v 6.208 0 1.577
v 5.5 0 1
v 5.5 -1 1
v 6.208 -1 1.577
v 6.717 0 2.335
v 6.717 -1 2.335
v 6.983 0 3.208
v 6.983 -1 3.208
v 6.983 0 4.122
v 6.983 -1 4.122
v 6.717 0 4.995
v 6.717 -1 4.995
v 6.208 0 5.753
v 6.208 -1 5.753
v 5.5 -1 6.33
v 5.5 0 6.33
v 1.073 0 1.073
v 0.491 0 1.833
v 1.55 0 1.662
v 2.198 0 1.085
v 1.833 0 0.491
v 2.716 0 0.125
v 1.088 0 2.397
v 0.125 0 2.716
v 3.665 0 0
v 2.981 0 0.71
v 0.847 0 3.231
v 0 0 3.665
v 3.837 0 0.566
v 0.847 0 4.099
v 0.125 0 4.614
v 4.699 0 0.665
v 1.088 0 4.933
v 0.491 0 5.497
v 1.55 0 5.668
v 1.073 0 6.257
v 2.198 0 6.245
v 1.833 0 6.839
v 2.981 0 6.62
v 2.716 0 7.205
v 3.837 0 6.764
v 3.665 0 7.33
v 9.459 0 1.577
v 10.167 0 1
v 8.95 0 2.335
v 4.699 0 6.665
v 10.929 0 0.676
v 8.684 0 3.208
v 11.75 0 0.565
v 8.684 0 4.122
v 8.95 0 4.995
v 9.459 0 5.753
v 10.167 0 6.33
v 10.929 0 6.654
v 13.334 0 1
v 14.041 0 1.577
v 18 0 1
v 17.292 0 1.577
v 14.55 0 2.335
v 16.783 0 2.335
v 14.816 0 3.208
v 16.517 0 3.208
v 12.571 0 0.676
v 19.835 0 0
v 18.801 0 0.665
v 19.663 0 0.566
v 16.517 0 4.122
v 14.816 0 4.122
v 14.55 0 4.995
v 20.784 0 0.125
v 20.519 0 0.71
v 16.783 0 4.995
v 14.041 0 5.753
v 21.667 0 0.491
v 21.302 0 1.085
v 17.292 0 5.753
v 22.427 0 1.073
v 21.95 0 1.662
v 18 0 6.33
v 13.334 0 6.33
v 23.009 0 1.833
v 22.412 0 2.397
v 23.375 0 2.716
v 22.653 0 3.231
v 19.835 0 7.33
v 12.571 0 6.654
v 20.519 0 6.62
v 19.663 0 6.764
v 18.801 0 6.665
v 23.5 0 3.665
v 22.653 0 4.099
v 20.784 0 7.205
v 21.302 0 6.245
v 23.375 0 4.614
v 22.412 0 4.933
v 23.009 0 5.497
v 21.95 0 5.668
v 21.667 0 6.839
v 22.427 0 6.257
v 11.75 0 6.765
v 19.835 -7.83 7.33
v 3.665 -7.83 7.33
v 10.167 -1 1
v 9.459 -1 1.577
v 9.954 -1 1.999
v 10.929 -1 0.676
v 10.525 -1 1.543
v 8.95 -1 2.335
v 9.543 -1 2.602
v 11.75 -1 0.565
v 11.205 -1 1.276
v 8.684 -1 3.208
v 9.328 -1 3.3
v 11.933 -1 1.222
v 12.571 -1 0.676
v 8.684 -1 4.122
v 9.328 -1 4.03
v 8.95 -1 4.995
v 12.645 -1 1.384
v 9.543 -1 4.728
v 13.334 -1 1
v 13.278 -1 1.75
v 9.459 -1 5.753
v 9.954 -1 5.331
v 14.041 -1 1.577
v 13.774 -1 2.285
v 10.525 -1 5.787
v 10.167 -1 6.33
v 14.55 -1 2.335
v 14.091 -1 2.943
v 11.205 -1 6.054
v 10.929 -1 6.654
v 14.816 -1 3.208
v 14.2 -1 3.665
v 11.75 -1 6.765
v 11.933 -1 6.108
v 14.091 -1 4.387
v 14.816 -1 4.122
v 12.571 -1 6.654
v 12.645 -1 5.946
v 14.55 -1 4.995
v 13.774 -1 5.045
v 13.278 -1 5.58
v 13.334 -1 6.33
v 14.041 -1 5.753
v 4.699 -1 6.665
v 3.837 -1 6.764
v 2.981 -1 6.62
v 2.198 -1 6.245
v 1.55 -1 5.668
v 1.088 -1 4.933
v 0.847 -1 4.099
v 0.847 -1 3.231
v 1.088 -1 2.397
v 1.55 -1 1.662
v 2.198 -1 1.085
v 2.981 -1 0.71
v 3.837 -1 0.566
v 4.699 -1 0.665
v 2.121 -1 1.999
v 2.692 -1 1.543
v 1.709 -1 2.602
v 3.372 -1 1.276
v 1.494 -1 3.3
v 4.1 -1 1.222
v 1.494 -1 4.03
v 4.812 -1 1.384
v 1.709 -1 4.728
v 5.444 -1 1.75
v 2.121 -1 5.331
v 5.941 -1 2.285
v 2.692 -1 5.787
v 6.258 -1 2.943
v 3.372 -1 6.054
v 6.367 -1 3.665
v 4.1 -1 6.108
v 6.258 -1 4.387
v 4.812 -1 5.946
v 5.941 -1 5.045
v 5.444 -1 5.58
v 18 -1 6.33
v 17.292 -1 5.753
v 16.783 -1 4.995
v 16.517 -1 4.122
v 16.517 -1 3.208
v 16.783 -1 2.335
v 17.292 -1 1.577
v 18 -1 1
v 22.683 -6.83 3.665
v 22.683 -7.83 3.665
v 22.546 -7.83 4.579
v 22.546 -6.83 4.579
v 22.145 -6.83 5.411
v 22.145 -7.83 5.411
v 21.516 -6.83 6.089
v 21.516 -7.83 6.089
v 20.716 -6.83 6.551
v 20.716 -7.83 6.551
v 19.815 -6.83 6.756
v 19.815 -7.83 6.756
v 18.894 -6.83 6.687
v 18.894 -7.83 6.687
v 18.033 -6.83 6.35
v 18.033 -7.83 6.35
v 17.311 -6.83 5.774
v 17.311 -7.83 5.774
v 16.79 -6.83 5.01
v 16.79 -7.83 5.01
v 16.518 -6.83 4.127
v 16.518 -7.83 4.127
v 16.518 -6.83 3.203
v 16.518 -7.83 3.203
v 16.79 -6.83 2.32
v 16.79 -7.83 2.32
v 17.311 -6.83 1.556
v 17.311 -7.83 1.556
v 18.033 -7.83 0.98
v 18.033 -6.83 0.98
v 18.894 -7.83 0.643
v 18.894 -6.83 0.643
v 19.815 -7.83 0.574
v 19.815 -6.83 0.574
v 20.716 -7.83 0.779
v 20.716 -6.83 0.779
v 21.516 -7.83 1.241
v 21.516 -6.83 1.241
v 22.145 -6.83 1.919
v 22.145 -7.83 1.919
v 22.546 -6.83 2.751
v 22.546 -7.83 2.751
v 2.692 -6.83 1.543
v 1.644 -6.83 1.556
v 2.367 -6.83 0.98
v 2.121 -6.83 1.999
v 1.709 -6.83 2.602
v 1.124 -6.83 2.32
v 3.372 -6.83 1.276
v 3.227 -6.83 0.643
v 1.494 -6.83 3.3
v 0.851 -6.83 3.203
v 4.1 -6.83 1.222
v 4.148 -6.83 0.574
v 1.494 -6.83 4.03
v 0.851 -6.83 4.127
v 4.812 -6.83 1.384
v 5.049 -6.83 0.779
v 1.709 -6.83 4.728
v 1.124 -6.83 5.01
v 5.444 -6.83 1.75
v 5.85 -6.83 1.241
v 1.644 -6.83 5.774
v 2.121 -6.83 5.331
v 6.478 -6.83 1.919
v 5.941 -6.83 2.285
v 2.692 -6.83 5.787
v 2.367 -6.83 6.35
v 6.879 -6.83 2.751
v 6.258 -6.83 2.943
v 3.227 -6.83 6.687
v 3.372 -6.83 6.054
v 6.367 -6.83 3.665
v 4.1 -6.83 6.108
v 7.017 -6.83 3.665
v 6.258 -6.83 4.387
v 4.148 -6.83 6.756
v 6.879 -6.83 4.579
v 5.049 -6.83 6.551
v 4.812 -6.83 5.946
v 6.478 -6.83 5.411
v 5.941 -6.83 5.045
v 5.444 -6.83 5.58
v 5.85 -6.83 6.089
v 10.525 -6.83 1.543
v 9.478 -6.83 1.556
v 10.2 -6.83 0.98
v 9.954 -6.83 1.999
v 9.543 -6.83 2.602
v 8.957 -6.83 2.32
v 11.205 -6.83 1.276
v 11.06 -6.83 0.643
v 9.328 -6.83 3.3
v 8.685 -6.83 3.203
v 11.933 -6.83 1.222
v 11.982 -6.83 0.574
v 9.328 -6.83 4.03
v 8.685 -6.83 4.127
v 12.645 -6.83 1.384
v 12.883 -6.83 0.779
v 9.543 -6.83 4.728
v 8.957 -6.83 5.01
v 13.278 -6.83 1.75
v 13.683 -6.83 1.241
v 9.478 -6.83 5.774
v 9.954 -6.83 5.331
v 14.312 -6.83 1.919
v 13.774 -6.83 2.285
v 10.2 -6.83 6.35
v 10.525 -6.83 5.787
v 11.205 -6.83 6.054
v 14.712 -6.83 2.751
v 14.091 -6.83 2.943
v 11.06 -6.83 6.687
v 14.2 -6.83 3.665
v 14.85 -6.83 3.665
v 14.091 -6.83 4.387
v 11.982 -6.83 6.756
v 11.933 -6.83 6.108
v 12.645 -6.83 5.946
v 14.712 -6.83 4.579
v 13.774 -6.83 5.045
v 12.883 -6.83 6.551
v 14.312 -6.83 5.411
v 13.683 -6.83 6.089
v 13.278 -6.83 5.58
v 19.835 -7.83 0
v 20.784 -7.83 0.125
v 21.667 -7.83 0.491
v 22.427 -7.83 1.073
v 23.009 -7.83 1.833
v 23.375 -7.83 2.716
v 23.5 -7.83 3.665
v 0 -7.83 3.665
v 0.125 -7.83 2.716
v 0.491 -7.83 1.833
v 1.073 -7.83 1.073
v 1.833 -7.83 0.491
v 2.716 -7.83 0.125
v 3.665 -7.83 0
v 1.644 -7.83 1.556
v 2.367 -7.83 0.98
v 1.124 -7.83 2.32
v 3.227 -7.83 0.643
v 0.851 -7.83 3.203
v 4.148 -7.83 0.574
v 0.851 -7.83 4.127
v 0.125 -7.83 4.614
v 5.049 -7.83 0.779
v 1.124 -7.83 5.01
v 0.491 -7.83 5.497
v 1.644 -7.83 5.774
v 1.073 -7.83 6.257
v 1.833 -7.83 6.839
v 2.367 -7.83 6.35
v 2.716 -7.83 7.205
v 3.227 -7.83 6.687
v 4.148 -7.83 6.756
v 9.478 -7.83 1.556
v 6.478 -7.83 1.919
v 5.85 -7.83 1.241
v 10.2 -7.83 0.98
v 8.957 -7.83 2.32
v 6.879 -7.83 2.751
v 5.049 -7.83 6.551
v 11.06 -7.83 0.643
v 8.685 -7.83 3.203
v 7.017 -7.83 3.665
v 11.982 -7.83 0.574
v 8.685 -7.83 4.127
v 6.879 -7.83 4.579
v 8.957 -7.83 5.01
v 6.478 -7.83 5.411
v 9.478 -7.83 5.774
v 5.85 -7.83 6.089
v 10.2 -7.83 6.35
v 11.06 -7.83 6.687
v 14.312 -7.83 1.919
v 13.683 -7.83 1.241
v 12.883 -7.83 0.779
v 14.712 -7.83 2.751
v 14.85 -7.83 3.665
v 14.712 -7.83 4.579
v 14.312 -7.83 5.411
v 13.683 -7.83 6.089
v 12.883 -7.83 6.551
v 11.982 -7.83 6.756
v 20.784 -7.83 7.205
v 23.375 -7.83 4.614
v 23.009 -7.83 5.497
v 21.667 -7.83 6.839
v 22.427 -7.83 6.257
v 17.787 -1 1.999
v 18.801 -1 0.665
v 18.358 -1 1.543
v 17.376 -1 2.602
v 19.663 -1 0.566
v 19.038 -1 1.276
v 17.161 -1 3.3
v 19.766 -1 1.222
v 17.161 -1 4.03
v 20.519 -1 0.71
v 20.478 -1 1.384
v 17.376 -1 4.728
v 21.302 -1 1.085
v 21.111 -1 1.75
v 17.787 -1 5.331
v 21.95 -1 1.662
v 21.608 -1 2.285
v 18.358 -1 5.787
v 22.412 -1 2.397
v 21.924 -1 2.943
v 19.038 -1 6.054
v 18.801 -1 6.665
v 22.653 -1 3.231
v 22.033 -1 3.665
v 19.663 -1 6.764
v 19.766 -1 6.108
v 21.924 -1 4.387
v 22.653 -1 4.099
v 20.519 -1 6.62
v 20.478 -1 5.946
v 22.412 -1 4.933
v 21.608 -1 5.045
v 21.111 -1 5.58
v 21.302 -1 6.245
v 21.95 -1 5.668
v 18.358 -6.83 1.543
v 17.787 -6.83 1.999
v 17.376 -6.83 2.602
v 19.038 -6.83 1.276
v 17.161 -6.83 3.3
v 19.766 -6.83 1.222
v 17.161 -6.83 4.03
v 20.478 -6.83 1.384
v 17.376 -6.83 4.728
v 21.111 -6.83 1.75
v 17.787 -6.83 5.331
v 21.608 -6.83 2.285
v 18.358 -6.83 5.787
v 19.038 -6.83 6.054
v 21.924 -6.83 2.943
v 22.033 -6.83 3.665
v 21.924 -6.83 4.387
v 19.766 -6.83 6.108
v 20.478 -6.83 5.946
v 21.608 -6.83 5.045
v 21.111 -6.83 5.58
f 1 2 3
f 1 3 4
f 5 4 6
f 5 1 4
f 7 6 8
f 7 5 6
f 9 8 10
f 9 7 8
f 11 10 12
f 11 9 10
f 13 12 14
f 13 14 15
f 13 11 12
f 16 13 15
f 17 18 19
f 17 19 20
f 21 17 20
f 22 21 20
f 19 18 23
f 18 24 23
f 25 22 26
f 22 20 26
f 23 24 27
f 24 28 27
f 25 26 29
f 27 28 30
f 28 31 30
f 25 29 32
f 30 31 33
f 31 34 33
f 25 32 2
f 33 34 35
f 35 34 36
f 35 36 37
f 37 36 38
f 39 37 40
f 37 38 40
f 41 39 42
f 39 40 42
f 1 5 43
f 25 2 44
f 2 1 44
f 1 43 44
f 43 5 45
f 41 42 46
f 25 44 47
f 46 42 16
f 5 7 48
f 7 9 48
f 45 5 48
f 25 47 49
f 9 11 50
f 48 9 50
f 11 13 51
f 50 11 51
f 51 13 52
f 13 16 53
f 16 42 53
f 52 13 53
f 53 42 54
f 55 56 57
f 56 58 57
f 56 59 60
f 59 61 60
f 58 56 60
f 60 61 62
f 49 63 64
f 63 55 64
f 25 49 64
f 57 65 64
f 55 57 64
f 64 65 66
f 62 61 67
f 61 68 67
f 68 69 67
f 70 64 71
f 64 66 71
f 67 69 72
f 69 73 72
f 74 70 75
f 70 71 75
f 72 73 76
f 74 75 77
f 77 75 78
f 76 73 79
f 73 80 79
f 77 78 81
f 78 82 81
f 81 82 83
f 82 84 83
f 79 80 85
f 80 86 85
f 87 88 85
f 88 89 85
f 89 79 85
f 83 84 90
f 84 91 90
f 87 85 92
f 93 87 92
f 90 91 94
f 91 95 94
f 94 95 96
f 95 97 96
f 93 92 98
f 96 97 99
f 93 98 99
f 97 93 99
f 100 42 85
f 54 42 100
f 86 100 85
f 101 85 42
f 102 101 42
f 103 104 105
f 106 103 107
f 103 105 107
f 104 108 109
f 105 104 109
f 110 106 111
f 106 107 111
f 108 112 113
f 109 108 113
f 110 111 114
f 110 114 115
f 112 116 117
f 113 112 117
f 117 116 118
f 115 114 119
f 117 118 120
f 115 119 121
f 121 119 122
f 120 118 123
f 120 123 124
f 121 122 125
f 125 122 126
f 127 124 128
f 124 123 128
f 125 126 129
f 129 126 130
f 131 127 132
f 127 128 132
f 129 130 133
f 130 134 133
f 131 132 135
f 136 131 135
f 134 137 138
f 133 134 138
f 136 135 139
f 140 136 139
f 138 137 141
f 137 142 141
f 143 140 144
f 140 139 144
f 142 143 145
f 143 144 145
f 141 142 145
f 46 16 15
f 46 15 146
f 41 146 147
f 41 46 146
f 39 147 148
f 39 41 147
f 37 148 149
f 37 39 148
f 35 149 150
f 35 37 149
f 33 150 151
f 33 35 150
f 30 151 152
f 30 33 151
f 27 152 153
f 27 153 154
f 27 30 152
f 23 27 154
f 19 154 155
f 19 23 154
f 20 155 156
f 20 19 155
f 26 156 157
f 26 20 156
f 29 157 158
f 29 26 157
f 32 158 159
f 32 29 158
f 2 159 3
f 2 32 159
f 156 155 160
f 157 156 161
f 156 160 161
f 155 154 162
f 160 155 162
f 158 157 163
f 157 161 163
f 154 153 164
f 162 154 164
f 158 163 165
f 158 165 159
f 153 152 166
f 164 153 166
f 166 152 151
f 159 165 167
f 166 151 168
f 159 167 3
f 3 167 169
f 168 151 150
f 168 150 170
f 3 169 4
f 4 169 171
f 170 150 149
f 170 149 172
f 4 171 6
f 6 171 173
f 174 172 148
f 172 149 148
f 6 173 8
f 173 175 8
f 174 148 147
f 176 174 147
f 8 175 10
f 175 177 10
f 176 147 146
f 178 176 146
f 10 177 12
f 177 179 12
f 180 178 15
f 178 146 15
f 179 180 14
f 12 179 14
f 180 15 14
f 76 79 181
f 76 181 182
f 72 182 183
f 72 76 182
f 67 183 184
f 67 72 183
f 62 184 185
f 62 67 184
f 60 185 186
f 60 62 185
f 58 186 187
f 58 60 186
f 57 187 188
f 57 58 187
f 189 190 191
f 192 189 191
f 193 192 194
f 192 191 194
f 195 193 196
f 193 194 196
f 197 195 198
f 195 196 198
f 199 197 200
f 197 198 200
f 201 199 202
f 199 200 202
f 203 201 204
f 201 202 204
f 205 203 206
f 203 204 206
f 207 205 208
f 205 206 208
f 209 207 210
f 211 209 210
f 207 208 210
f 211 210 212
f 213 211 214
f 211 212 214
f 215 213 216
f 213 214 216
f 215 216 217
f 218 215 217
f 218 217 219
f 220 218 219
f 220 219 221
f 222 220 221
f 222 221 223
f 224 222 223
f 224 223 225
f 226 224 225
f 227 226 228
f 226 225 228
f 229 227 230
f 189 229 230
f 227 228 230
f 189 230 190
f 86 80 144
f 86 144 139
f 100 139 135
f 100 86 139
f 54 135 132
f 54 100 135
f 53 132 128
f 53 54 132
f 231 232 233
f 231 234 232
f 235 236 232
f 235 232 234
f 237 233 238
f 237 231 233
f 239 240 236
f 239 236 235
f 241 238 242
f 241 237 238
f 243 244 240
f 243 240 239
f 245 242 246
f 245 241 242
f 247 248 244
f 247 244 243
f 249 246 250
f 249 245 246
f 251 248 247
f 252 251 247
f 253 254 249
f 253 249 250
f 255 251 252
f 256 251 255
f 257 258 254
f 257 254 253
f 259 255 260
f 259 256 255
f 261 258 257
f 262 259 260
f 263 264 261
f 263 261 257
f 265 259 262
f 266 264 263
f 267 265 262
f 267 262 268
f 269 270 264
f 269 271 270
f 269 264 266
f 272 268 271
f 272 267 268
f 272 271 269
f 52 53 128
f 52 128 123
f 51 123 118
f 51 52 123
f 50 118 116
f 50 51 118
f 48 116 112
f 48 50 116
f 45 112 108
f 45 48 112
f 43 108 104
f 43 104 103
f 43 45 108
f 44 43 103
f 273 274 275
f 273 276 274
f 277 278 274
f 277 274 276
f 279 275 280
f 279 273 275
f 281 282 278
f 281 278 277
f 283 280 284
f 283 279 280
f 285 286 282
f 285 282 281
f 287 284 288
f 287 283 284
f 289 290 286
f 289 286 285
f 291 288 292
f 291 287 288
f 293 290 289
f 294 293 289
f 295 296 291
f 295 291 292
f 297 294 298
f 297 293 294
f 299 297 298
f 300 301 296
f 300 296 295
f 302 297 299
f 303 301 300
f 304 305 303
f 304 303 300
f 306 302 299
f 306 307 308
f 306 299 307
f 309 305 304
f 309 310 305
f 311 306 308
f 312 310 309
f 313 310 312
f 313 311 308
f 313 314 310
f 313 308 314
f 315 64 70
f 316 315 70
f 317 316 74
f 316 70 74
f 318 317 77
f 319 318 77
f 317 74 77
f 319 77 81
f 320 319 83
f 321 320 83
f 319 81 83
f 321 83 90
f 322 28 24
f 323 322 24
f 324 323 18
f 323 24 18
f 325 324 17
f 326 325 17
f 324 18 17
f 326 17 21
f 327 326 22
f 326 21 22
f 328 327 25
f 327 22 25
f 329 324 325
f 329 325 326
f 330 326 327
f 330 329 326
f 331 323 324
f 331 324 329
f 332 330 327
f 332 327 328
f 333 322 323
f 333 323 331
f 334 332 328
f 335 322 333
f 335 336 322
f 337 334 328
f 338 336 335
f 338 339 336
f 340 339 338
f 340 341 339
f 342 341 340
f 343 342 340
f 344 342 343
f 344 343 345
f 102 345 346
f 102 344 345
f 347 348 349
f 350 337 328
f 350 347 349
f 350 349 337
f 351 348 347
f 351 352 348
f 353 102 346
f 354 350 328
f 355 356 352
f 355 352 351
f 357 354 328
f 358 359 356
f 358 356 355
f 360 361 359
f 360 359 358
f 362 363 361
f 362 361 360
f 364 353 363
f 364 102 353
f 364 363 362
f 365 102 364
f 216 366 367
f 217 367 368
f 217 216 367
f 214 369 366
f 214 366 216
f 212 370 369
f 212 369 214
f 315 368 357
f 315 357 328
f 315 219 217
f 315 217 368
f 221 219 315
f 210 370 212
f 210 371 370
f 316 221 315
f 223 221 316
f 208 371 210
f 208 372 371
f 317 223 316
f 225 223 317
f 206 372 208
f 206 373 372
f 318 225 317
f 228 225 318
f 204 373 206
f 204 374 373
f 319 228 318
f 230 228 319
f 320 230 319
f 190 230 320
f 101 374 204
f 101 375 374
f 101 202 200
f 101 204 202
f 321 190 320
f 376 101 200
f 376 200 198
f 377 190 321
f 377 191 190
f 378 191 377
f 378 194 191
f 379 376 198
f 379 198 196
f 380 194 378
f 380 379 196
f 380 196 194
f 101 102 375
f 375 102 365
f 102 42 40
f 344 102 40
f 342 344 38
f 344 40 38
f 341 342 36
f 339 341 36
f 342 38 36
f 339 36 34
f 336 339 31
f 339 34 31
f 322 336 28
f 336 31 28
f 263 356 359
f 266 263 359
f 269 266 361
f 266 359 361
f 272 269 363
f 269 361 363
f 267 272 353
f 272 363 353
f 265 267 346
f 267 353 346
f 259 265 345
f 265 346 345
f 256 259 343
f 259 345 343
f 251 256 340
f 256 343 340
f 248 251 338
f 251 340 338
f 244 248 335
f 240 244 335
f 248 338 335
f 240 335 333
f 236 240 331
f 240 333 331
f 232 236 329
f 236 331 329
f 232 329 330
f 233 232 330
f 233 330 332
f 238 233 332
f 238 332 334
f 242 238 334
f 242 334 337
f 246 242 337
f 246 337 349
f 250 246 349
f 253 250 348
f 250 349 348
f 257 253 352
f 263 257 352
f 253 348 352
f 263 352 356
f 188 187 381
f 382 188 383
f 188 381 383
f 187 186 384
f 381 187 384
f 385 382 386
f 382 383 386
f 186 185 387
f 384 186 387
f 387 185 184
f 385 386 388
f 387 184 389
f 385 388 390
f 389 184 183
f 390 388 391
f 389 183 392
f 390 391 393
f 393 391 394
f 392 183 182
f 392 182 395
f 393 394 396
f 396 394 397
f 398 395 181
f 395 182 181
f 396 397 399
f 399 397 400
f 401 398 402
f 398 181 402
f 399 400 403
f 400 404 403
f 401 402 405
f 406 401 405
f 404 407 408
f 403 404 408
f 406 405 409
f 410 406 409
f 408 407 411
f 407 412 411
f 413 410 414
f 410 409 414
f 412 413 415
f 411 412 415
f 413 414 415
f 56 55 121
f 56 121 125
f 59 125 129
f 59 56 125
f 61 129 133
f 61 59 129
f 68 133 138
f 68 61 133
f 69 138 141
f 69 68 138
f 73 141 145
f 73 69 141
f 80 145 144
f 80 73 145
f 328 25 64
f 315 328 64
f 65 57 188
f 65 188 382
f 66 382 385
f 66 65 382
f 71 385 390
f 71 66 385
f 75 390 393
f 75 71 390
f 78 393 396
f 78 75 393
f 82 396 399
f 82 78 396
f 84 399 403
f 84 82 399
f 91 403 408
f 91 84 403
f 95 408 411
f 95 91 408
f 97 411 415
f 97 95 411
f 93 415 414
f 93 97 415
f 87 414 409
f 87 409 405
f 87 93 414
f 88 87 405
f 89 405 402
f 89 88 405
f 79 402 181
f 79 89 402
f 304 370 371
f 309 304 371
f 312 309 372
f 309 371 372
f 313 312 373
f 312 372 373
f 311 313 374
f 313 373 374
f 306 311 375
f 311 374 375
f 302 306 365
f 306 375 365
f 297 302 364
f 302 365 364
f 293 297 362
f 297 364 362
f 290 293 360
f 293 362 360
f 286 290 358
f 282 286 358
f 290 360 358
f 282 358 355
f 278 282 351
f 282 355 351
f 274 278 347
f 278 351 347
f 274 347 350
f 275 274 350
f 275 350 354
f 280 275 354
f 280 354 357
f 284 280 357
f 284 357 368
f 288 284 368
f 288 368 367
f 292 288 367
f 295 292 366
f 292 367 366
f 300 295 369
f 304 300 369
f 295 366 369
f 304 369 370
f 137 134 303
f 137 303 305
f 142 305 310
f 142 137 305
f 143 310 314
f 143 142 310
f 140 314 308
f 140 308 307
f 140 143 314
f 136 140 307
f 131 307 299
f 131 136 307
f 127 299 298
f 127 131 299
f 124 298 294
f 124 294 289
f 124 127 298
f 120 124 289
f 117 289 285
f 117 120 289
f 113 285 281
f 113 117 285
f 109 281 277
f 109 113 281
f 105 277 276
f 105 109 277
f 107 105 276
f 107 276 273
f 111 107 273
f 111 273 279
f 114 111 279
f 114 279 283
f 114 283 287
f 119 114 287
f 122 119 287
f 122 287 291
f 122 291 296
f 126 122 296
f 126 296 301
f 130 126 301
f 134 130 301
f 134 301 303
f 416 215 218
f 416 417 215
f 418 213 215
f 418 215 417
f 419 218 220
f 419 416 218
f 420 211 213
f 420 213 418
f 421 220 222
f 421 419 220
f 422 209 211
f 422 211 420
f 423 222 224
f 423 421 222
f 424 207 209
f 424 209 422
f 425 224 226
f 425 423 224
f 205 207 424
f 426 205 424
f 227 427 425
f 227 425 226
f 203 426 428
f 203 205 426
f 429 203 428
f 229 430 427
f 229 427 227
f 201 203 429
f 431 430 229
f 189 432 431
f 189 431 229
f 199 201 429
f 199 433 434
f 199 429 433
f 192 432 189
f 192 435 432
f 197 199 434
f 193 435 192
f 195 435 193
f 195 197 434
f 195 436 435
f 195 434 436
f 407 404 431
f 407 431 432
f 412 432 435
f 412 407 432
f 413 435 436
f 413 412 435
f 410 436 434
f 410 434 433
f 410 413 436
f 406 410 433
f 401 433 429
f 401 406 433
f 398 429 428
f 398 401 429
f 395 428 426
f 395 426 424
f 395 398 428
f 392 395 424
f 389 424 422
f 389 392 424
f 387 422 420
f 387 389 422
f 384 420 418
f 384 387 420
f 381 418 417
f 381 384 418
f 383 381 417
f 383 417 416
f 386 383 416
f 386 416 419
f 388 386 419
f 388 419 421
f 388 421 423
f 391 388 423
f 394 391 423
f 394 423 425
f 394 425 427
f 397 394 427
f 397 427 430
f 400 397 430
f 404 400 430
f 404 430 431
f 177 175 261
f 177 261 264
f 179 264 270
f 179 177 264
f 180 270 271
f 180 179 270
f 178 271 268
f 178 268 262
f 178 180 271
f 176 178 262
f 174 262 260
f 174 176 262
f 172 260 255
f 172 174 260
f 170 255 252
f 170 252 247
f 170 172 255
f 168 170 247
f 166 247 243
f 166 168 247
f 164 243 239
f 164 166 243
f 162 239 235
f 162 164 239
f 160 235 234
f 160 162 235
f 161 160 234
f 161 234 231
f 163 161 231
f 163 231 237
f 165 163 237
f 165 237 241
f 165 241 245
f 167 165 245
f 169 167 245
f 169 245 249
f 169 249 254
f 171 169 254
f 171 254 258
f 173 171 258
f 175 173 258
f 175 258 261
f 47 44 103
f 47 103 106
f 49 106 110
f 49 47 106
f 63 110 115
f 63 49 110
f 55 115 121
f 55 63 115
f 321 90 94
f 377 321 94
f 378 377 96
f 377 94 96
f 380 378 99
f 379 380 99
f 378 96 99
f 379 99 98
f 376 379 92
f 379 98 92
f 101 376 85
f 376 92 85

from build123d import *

# Parameters (mm, degrees)
F0_R     = 2.45
F1_DEPTH = 7.83
F2_DEPTH = 1
F3_R     = 3.1
F3_R_2   = 2.45
F4_DEPTH = 1


with BuildPart() as f1:
    # F0 (on Front) → F1 (new body)
    with BuildSketch(Plane.XZ):
        with BuildLine():
            ThreePointArc((0, 3.665), (1.073454, 1.073454), (3.665, 0))
            Line((3.665, 0), (19.835, 0))
            ThreePointArc((19.835, 0), (22.426546, 1.073454), (23.5, 3.665))
            ThreePointArc((23.5, 3.665), (22.426546, 6.256546), (19.835, 7.33))
            Line((19.835, 7.33), (15.666667, 7.33))
            Line((15.666667, 7.33), (7.833667, 7.33))
            Line((7.833667, 7.33), (3.665, 7.33))
            ThreePointArc((3.665, 7.33), (1.073454, 6.256546), (0, 3.665))
        make_face()
        with BuildLine():
            ThreePointArc((10.166571, 1), (8.650167, 3.665), (10.166571, 6.33))
            ThreePointArc((10.166571, 6.33), (11.750167, 6.765), (13.333762, 6.33))
            ThreePointArc((13.333762, 6.33), (14.850167, 3.665), (13.333762, 1))
            ThreePointArc((13.333762, 1), (11.750167, 0.565), (10.166571, 1))
        make_face(mode=Mode.SUBTRACT)
        with BuildLine():
            ThreePointArc((17.999738, 1), (16.483333, 3.665), (17.999738, 6.33))
            ThreePointArc((17.999738, 6.33), (22.683333, 3.665), (17.999738, 1))
        make_face(mode=Mode.SUBTRACT)
        with BuildLine():
            ThreePointArc((5.500429, 1), (0.816833, 3.665), (5.500429, 6.33))
            ThreePointArc((5.500429, 6.33), (7.016833, 3.665), (5.500429, 1))
        make_face(mode=Mode.SUBTRACT)
        with BuildLine():
            ThreePointArc((5.500429, 1), (7.016833, 3.665), (5.500429, 6.33))
            ThreePointArc((5.500429, 6.33), (0.816833, 3.665), (5.500429, 1))
        make_face()
        with Locations((3.916833, 3.665)):
            Circle(F0_R, mode=Mode.SUBTRACT)
        with BuildLine():
            ThreePointArc((13.333762, 6.33), (11.750167, 6.765), (10.166571, 6.33))
            ThreePointArc((10.166571, 6.33), (8.650167, 3.665), (10.166571, 1))
            ThreePointArc((10.166571, 1), (11.750167, 0.565), (13.333762, 1))
            ThreePointArc((13.333762, 1), (14.850167, 3.665), (13.333762, 6.33))
        make_face()
        with Locations((11.750167, 3.665)):
            Circle(F0_R, mode=Mode.SUBTRACT)
        with BuildLine():
            ThreePointArc((17.999738, 1), (22.683333, 3.665), (17.999738, 6.33))
            ThreePointArc((17.999738, 6.33), (16.483333, 3.665), (17.999738, 1))
        make_face()
        with Locations((19.583333, 3.665)):
            Circle(F0_R, mode=Mode.SUBTRACT)
    extrude(amount=F1_DEPTH)

    # F0 (on Front) → F2 (cut)
    with BuildSketch(Plane.XZ):
        with BuildLine():
            ThreePointArc((5.500429, 1), (7.016833, 3.665), (5.500429, 6.33))
            ThreePointArc((5.500429, 6.33), (0.816833, 3.665), (5.500429, 1))
        make_face()
        with Locations((3.916833, 3.665)):
            Circle(F0_R, mode=Mode.SUBTRACT)
        with BuildLine():
            ThreePointArc((13.333762, 6.33), (11.750167, 6.765), (10.166571, 6.33))
            ThreePointArc((10.166571, 6.33), (8.650167, 3.665), (10.166571, 1))
            ThreePointArc((10.166571, 1), (11.750167, 0.565), (13.333762, 1))
            ThreePointArc((13.333762, 1), (14.850167, 3.665), (13.333762, 6.33))
        make_face()
        with Locations((11.750167, 3.665)):
            Circle(F0_R, mode=Mode.SUBTRACT)
        with BuildLine():
            ThreePointArc((17.999738, 1), (22.683333, 3.665), (17.999738, 6.33))
            ThreePointArc((17.999738, 6.33), (16.483333, 3.665), (17.999738, 1))
        make_face()
        with Locations((19.583333, 3.665)):
            Circle(F0_R, mode=Mode.SUBTRACT)
    extrude(amount=F2_DEPTH, mode=Mode.SUBTRACT)

    # F3 (on face) → F4 (cut)
    with BuildSketch(Plane.XZ.offset(7.83)):
        with Locations((3.916833, 3.665)):
            Circle(F3_R)
        with Locations((3.916833, 3.665)):
            Circle(F3_R_2, mode=Mode.SUBTRACT)
        with Locations((11.750167, 3.665)):
            Circle(F3_R)
        with Locations((11.750167, 3.665)):
            Circle(F3_R_2, mode=Mode.SUBTRACT)
        with Locations((19.583333, 3.665)):
            Circle(F3_R)
        with Locations((19.583333, 3.665)):
            Circle(F3_R_2, mode=Mode.SUBTRACT)
    extrude(amount=-F4_DEPTH, mode=Mode.SUBTRACT)


solid = f1.part
